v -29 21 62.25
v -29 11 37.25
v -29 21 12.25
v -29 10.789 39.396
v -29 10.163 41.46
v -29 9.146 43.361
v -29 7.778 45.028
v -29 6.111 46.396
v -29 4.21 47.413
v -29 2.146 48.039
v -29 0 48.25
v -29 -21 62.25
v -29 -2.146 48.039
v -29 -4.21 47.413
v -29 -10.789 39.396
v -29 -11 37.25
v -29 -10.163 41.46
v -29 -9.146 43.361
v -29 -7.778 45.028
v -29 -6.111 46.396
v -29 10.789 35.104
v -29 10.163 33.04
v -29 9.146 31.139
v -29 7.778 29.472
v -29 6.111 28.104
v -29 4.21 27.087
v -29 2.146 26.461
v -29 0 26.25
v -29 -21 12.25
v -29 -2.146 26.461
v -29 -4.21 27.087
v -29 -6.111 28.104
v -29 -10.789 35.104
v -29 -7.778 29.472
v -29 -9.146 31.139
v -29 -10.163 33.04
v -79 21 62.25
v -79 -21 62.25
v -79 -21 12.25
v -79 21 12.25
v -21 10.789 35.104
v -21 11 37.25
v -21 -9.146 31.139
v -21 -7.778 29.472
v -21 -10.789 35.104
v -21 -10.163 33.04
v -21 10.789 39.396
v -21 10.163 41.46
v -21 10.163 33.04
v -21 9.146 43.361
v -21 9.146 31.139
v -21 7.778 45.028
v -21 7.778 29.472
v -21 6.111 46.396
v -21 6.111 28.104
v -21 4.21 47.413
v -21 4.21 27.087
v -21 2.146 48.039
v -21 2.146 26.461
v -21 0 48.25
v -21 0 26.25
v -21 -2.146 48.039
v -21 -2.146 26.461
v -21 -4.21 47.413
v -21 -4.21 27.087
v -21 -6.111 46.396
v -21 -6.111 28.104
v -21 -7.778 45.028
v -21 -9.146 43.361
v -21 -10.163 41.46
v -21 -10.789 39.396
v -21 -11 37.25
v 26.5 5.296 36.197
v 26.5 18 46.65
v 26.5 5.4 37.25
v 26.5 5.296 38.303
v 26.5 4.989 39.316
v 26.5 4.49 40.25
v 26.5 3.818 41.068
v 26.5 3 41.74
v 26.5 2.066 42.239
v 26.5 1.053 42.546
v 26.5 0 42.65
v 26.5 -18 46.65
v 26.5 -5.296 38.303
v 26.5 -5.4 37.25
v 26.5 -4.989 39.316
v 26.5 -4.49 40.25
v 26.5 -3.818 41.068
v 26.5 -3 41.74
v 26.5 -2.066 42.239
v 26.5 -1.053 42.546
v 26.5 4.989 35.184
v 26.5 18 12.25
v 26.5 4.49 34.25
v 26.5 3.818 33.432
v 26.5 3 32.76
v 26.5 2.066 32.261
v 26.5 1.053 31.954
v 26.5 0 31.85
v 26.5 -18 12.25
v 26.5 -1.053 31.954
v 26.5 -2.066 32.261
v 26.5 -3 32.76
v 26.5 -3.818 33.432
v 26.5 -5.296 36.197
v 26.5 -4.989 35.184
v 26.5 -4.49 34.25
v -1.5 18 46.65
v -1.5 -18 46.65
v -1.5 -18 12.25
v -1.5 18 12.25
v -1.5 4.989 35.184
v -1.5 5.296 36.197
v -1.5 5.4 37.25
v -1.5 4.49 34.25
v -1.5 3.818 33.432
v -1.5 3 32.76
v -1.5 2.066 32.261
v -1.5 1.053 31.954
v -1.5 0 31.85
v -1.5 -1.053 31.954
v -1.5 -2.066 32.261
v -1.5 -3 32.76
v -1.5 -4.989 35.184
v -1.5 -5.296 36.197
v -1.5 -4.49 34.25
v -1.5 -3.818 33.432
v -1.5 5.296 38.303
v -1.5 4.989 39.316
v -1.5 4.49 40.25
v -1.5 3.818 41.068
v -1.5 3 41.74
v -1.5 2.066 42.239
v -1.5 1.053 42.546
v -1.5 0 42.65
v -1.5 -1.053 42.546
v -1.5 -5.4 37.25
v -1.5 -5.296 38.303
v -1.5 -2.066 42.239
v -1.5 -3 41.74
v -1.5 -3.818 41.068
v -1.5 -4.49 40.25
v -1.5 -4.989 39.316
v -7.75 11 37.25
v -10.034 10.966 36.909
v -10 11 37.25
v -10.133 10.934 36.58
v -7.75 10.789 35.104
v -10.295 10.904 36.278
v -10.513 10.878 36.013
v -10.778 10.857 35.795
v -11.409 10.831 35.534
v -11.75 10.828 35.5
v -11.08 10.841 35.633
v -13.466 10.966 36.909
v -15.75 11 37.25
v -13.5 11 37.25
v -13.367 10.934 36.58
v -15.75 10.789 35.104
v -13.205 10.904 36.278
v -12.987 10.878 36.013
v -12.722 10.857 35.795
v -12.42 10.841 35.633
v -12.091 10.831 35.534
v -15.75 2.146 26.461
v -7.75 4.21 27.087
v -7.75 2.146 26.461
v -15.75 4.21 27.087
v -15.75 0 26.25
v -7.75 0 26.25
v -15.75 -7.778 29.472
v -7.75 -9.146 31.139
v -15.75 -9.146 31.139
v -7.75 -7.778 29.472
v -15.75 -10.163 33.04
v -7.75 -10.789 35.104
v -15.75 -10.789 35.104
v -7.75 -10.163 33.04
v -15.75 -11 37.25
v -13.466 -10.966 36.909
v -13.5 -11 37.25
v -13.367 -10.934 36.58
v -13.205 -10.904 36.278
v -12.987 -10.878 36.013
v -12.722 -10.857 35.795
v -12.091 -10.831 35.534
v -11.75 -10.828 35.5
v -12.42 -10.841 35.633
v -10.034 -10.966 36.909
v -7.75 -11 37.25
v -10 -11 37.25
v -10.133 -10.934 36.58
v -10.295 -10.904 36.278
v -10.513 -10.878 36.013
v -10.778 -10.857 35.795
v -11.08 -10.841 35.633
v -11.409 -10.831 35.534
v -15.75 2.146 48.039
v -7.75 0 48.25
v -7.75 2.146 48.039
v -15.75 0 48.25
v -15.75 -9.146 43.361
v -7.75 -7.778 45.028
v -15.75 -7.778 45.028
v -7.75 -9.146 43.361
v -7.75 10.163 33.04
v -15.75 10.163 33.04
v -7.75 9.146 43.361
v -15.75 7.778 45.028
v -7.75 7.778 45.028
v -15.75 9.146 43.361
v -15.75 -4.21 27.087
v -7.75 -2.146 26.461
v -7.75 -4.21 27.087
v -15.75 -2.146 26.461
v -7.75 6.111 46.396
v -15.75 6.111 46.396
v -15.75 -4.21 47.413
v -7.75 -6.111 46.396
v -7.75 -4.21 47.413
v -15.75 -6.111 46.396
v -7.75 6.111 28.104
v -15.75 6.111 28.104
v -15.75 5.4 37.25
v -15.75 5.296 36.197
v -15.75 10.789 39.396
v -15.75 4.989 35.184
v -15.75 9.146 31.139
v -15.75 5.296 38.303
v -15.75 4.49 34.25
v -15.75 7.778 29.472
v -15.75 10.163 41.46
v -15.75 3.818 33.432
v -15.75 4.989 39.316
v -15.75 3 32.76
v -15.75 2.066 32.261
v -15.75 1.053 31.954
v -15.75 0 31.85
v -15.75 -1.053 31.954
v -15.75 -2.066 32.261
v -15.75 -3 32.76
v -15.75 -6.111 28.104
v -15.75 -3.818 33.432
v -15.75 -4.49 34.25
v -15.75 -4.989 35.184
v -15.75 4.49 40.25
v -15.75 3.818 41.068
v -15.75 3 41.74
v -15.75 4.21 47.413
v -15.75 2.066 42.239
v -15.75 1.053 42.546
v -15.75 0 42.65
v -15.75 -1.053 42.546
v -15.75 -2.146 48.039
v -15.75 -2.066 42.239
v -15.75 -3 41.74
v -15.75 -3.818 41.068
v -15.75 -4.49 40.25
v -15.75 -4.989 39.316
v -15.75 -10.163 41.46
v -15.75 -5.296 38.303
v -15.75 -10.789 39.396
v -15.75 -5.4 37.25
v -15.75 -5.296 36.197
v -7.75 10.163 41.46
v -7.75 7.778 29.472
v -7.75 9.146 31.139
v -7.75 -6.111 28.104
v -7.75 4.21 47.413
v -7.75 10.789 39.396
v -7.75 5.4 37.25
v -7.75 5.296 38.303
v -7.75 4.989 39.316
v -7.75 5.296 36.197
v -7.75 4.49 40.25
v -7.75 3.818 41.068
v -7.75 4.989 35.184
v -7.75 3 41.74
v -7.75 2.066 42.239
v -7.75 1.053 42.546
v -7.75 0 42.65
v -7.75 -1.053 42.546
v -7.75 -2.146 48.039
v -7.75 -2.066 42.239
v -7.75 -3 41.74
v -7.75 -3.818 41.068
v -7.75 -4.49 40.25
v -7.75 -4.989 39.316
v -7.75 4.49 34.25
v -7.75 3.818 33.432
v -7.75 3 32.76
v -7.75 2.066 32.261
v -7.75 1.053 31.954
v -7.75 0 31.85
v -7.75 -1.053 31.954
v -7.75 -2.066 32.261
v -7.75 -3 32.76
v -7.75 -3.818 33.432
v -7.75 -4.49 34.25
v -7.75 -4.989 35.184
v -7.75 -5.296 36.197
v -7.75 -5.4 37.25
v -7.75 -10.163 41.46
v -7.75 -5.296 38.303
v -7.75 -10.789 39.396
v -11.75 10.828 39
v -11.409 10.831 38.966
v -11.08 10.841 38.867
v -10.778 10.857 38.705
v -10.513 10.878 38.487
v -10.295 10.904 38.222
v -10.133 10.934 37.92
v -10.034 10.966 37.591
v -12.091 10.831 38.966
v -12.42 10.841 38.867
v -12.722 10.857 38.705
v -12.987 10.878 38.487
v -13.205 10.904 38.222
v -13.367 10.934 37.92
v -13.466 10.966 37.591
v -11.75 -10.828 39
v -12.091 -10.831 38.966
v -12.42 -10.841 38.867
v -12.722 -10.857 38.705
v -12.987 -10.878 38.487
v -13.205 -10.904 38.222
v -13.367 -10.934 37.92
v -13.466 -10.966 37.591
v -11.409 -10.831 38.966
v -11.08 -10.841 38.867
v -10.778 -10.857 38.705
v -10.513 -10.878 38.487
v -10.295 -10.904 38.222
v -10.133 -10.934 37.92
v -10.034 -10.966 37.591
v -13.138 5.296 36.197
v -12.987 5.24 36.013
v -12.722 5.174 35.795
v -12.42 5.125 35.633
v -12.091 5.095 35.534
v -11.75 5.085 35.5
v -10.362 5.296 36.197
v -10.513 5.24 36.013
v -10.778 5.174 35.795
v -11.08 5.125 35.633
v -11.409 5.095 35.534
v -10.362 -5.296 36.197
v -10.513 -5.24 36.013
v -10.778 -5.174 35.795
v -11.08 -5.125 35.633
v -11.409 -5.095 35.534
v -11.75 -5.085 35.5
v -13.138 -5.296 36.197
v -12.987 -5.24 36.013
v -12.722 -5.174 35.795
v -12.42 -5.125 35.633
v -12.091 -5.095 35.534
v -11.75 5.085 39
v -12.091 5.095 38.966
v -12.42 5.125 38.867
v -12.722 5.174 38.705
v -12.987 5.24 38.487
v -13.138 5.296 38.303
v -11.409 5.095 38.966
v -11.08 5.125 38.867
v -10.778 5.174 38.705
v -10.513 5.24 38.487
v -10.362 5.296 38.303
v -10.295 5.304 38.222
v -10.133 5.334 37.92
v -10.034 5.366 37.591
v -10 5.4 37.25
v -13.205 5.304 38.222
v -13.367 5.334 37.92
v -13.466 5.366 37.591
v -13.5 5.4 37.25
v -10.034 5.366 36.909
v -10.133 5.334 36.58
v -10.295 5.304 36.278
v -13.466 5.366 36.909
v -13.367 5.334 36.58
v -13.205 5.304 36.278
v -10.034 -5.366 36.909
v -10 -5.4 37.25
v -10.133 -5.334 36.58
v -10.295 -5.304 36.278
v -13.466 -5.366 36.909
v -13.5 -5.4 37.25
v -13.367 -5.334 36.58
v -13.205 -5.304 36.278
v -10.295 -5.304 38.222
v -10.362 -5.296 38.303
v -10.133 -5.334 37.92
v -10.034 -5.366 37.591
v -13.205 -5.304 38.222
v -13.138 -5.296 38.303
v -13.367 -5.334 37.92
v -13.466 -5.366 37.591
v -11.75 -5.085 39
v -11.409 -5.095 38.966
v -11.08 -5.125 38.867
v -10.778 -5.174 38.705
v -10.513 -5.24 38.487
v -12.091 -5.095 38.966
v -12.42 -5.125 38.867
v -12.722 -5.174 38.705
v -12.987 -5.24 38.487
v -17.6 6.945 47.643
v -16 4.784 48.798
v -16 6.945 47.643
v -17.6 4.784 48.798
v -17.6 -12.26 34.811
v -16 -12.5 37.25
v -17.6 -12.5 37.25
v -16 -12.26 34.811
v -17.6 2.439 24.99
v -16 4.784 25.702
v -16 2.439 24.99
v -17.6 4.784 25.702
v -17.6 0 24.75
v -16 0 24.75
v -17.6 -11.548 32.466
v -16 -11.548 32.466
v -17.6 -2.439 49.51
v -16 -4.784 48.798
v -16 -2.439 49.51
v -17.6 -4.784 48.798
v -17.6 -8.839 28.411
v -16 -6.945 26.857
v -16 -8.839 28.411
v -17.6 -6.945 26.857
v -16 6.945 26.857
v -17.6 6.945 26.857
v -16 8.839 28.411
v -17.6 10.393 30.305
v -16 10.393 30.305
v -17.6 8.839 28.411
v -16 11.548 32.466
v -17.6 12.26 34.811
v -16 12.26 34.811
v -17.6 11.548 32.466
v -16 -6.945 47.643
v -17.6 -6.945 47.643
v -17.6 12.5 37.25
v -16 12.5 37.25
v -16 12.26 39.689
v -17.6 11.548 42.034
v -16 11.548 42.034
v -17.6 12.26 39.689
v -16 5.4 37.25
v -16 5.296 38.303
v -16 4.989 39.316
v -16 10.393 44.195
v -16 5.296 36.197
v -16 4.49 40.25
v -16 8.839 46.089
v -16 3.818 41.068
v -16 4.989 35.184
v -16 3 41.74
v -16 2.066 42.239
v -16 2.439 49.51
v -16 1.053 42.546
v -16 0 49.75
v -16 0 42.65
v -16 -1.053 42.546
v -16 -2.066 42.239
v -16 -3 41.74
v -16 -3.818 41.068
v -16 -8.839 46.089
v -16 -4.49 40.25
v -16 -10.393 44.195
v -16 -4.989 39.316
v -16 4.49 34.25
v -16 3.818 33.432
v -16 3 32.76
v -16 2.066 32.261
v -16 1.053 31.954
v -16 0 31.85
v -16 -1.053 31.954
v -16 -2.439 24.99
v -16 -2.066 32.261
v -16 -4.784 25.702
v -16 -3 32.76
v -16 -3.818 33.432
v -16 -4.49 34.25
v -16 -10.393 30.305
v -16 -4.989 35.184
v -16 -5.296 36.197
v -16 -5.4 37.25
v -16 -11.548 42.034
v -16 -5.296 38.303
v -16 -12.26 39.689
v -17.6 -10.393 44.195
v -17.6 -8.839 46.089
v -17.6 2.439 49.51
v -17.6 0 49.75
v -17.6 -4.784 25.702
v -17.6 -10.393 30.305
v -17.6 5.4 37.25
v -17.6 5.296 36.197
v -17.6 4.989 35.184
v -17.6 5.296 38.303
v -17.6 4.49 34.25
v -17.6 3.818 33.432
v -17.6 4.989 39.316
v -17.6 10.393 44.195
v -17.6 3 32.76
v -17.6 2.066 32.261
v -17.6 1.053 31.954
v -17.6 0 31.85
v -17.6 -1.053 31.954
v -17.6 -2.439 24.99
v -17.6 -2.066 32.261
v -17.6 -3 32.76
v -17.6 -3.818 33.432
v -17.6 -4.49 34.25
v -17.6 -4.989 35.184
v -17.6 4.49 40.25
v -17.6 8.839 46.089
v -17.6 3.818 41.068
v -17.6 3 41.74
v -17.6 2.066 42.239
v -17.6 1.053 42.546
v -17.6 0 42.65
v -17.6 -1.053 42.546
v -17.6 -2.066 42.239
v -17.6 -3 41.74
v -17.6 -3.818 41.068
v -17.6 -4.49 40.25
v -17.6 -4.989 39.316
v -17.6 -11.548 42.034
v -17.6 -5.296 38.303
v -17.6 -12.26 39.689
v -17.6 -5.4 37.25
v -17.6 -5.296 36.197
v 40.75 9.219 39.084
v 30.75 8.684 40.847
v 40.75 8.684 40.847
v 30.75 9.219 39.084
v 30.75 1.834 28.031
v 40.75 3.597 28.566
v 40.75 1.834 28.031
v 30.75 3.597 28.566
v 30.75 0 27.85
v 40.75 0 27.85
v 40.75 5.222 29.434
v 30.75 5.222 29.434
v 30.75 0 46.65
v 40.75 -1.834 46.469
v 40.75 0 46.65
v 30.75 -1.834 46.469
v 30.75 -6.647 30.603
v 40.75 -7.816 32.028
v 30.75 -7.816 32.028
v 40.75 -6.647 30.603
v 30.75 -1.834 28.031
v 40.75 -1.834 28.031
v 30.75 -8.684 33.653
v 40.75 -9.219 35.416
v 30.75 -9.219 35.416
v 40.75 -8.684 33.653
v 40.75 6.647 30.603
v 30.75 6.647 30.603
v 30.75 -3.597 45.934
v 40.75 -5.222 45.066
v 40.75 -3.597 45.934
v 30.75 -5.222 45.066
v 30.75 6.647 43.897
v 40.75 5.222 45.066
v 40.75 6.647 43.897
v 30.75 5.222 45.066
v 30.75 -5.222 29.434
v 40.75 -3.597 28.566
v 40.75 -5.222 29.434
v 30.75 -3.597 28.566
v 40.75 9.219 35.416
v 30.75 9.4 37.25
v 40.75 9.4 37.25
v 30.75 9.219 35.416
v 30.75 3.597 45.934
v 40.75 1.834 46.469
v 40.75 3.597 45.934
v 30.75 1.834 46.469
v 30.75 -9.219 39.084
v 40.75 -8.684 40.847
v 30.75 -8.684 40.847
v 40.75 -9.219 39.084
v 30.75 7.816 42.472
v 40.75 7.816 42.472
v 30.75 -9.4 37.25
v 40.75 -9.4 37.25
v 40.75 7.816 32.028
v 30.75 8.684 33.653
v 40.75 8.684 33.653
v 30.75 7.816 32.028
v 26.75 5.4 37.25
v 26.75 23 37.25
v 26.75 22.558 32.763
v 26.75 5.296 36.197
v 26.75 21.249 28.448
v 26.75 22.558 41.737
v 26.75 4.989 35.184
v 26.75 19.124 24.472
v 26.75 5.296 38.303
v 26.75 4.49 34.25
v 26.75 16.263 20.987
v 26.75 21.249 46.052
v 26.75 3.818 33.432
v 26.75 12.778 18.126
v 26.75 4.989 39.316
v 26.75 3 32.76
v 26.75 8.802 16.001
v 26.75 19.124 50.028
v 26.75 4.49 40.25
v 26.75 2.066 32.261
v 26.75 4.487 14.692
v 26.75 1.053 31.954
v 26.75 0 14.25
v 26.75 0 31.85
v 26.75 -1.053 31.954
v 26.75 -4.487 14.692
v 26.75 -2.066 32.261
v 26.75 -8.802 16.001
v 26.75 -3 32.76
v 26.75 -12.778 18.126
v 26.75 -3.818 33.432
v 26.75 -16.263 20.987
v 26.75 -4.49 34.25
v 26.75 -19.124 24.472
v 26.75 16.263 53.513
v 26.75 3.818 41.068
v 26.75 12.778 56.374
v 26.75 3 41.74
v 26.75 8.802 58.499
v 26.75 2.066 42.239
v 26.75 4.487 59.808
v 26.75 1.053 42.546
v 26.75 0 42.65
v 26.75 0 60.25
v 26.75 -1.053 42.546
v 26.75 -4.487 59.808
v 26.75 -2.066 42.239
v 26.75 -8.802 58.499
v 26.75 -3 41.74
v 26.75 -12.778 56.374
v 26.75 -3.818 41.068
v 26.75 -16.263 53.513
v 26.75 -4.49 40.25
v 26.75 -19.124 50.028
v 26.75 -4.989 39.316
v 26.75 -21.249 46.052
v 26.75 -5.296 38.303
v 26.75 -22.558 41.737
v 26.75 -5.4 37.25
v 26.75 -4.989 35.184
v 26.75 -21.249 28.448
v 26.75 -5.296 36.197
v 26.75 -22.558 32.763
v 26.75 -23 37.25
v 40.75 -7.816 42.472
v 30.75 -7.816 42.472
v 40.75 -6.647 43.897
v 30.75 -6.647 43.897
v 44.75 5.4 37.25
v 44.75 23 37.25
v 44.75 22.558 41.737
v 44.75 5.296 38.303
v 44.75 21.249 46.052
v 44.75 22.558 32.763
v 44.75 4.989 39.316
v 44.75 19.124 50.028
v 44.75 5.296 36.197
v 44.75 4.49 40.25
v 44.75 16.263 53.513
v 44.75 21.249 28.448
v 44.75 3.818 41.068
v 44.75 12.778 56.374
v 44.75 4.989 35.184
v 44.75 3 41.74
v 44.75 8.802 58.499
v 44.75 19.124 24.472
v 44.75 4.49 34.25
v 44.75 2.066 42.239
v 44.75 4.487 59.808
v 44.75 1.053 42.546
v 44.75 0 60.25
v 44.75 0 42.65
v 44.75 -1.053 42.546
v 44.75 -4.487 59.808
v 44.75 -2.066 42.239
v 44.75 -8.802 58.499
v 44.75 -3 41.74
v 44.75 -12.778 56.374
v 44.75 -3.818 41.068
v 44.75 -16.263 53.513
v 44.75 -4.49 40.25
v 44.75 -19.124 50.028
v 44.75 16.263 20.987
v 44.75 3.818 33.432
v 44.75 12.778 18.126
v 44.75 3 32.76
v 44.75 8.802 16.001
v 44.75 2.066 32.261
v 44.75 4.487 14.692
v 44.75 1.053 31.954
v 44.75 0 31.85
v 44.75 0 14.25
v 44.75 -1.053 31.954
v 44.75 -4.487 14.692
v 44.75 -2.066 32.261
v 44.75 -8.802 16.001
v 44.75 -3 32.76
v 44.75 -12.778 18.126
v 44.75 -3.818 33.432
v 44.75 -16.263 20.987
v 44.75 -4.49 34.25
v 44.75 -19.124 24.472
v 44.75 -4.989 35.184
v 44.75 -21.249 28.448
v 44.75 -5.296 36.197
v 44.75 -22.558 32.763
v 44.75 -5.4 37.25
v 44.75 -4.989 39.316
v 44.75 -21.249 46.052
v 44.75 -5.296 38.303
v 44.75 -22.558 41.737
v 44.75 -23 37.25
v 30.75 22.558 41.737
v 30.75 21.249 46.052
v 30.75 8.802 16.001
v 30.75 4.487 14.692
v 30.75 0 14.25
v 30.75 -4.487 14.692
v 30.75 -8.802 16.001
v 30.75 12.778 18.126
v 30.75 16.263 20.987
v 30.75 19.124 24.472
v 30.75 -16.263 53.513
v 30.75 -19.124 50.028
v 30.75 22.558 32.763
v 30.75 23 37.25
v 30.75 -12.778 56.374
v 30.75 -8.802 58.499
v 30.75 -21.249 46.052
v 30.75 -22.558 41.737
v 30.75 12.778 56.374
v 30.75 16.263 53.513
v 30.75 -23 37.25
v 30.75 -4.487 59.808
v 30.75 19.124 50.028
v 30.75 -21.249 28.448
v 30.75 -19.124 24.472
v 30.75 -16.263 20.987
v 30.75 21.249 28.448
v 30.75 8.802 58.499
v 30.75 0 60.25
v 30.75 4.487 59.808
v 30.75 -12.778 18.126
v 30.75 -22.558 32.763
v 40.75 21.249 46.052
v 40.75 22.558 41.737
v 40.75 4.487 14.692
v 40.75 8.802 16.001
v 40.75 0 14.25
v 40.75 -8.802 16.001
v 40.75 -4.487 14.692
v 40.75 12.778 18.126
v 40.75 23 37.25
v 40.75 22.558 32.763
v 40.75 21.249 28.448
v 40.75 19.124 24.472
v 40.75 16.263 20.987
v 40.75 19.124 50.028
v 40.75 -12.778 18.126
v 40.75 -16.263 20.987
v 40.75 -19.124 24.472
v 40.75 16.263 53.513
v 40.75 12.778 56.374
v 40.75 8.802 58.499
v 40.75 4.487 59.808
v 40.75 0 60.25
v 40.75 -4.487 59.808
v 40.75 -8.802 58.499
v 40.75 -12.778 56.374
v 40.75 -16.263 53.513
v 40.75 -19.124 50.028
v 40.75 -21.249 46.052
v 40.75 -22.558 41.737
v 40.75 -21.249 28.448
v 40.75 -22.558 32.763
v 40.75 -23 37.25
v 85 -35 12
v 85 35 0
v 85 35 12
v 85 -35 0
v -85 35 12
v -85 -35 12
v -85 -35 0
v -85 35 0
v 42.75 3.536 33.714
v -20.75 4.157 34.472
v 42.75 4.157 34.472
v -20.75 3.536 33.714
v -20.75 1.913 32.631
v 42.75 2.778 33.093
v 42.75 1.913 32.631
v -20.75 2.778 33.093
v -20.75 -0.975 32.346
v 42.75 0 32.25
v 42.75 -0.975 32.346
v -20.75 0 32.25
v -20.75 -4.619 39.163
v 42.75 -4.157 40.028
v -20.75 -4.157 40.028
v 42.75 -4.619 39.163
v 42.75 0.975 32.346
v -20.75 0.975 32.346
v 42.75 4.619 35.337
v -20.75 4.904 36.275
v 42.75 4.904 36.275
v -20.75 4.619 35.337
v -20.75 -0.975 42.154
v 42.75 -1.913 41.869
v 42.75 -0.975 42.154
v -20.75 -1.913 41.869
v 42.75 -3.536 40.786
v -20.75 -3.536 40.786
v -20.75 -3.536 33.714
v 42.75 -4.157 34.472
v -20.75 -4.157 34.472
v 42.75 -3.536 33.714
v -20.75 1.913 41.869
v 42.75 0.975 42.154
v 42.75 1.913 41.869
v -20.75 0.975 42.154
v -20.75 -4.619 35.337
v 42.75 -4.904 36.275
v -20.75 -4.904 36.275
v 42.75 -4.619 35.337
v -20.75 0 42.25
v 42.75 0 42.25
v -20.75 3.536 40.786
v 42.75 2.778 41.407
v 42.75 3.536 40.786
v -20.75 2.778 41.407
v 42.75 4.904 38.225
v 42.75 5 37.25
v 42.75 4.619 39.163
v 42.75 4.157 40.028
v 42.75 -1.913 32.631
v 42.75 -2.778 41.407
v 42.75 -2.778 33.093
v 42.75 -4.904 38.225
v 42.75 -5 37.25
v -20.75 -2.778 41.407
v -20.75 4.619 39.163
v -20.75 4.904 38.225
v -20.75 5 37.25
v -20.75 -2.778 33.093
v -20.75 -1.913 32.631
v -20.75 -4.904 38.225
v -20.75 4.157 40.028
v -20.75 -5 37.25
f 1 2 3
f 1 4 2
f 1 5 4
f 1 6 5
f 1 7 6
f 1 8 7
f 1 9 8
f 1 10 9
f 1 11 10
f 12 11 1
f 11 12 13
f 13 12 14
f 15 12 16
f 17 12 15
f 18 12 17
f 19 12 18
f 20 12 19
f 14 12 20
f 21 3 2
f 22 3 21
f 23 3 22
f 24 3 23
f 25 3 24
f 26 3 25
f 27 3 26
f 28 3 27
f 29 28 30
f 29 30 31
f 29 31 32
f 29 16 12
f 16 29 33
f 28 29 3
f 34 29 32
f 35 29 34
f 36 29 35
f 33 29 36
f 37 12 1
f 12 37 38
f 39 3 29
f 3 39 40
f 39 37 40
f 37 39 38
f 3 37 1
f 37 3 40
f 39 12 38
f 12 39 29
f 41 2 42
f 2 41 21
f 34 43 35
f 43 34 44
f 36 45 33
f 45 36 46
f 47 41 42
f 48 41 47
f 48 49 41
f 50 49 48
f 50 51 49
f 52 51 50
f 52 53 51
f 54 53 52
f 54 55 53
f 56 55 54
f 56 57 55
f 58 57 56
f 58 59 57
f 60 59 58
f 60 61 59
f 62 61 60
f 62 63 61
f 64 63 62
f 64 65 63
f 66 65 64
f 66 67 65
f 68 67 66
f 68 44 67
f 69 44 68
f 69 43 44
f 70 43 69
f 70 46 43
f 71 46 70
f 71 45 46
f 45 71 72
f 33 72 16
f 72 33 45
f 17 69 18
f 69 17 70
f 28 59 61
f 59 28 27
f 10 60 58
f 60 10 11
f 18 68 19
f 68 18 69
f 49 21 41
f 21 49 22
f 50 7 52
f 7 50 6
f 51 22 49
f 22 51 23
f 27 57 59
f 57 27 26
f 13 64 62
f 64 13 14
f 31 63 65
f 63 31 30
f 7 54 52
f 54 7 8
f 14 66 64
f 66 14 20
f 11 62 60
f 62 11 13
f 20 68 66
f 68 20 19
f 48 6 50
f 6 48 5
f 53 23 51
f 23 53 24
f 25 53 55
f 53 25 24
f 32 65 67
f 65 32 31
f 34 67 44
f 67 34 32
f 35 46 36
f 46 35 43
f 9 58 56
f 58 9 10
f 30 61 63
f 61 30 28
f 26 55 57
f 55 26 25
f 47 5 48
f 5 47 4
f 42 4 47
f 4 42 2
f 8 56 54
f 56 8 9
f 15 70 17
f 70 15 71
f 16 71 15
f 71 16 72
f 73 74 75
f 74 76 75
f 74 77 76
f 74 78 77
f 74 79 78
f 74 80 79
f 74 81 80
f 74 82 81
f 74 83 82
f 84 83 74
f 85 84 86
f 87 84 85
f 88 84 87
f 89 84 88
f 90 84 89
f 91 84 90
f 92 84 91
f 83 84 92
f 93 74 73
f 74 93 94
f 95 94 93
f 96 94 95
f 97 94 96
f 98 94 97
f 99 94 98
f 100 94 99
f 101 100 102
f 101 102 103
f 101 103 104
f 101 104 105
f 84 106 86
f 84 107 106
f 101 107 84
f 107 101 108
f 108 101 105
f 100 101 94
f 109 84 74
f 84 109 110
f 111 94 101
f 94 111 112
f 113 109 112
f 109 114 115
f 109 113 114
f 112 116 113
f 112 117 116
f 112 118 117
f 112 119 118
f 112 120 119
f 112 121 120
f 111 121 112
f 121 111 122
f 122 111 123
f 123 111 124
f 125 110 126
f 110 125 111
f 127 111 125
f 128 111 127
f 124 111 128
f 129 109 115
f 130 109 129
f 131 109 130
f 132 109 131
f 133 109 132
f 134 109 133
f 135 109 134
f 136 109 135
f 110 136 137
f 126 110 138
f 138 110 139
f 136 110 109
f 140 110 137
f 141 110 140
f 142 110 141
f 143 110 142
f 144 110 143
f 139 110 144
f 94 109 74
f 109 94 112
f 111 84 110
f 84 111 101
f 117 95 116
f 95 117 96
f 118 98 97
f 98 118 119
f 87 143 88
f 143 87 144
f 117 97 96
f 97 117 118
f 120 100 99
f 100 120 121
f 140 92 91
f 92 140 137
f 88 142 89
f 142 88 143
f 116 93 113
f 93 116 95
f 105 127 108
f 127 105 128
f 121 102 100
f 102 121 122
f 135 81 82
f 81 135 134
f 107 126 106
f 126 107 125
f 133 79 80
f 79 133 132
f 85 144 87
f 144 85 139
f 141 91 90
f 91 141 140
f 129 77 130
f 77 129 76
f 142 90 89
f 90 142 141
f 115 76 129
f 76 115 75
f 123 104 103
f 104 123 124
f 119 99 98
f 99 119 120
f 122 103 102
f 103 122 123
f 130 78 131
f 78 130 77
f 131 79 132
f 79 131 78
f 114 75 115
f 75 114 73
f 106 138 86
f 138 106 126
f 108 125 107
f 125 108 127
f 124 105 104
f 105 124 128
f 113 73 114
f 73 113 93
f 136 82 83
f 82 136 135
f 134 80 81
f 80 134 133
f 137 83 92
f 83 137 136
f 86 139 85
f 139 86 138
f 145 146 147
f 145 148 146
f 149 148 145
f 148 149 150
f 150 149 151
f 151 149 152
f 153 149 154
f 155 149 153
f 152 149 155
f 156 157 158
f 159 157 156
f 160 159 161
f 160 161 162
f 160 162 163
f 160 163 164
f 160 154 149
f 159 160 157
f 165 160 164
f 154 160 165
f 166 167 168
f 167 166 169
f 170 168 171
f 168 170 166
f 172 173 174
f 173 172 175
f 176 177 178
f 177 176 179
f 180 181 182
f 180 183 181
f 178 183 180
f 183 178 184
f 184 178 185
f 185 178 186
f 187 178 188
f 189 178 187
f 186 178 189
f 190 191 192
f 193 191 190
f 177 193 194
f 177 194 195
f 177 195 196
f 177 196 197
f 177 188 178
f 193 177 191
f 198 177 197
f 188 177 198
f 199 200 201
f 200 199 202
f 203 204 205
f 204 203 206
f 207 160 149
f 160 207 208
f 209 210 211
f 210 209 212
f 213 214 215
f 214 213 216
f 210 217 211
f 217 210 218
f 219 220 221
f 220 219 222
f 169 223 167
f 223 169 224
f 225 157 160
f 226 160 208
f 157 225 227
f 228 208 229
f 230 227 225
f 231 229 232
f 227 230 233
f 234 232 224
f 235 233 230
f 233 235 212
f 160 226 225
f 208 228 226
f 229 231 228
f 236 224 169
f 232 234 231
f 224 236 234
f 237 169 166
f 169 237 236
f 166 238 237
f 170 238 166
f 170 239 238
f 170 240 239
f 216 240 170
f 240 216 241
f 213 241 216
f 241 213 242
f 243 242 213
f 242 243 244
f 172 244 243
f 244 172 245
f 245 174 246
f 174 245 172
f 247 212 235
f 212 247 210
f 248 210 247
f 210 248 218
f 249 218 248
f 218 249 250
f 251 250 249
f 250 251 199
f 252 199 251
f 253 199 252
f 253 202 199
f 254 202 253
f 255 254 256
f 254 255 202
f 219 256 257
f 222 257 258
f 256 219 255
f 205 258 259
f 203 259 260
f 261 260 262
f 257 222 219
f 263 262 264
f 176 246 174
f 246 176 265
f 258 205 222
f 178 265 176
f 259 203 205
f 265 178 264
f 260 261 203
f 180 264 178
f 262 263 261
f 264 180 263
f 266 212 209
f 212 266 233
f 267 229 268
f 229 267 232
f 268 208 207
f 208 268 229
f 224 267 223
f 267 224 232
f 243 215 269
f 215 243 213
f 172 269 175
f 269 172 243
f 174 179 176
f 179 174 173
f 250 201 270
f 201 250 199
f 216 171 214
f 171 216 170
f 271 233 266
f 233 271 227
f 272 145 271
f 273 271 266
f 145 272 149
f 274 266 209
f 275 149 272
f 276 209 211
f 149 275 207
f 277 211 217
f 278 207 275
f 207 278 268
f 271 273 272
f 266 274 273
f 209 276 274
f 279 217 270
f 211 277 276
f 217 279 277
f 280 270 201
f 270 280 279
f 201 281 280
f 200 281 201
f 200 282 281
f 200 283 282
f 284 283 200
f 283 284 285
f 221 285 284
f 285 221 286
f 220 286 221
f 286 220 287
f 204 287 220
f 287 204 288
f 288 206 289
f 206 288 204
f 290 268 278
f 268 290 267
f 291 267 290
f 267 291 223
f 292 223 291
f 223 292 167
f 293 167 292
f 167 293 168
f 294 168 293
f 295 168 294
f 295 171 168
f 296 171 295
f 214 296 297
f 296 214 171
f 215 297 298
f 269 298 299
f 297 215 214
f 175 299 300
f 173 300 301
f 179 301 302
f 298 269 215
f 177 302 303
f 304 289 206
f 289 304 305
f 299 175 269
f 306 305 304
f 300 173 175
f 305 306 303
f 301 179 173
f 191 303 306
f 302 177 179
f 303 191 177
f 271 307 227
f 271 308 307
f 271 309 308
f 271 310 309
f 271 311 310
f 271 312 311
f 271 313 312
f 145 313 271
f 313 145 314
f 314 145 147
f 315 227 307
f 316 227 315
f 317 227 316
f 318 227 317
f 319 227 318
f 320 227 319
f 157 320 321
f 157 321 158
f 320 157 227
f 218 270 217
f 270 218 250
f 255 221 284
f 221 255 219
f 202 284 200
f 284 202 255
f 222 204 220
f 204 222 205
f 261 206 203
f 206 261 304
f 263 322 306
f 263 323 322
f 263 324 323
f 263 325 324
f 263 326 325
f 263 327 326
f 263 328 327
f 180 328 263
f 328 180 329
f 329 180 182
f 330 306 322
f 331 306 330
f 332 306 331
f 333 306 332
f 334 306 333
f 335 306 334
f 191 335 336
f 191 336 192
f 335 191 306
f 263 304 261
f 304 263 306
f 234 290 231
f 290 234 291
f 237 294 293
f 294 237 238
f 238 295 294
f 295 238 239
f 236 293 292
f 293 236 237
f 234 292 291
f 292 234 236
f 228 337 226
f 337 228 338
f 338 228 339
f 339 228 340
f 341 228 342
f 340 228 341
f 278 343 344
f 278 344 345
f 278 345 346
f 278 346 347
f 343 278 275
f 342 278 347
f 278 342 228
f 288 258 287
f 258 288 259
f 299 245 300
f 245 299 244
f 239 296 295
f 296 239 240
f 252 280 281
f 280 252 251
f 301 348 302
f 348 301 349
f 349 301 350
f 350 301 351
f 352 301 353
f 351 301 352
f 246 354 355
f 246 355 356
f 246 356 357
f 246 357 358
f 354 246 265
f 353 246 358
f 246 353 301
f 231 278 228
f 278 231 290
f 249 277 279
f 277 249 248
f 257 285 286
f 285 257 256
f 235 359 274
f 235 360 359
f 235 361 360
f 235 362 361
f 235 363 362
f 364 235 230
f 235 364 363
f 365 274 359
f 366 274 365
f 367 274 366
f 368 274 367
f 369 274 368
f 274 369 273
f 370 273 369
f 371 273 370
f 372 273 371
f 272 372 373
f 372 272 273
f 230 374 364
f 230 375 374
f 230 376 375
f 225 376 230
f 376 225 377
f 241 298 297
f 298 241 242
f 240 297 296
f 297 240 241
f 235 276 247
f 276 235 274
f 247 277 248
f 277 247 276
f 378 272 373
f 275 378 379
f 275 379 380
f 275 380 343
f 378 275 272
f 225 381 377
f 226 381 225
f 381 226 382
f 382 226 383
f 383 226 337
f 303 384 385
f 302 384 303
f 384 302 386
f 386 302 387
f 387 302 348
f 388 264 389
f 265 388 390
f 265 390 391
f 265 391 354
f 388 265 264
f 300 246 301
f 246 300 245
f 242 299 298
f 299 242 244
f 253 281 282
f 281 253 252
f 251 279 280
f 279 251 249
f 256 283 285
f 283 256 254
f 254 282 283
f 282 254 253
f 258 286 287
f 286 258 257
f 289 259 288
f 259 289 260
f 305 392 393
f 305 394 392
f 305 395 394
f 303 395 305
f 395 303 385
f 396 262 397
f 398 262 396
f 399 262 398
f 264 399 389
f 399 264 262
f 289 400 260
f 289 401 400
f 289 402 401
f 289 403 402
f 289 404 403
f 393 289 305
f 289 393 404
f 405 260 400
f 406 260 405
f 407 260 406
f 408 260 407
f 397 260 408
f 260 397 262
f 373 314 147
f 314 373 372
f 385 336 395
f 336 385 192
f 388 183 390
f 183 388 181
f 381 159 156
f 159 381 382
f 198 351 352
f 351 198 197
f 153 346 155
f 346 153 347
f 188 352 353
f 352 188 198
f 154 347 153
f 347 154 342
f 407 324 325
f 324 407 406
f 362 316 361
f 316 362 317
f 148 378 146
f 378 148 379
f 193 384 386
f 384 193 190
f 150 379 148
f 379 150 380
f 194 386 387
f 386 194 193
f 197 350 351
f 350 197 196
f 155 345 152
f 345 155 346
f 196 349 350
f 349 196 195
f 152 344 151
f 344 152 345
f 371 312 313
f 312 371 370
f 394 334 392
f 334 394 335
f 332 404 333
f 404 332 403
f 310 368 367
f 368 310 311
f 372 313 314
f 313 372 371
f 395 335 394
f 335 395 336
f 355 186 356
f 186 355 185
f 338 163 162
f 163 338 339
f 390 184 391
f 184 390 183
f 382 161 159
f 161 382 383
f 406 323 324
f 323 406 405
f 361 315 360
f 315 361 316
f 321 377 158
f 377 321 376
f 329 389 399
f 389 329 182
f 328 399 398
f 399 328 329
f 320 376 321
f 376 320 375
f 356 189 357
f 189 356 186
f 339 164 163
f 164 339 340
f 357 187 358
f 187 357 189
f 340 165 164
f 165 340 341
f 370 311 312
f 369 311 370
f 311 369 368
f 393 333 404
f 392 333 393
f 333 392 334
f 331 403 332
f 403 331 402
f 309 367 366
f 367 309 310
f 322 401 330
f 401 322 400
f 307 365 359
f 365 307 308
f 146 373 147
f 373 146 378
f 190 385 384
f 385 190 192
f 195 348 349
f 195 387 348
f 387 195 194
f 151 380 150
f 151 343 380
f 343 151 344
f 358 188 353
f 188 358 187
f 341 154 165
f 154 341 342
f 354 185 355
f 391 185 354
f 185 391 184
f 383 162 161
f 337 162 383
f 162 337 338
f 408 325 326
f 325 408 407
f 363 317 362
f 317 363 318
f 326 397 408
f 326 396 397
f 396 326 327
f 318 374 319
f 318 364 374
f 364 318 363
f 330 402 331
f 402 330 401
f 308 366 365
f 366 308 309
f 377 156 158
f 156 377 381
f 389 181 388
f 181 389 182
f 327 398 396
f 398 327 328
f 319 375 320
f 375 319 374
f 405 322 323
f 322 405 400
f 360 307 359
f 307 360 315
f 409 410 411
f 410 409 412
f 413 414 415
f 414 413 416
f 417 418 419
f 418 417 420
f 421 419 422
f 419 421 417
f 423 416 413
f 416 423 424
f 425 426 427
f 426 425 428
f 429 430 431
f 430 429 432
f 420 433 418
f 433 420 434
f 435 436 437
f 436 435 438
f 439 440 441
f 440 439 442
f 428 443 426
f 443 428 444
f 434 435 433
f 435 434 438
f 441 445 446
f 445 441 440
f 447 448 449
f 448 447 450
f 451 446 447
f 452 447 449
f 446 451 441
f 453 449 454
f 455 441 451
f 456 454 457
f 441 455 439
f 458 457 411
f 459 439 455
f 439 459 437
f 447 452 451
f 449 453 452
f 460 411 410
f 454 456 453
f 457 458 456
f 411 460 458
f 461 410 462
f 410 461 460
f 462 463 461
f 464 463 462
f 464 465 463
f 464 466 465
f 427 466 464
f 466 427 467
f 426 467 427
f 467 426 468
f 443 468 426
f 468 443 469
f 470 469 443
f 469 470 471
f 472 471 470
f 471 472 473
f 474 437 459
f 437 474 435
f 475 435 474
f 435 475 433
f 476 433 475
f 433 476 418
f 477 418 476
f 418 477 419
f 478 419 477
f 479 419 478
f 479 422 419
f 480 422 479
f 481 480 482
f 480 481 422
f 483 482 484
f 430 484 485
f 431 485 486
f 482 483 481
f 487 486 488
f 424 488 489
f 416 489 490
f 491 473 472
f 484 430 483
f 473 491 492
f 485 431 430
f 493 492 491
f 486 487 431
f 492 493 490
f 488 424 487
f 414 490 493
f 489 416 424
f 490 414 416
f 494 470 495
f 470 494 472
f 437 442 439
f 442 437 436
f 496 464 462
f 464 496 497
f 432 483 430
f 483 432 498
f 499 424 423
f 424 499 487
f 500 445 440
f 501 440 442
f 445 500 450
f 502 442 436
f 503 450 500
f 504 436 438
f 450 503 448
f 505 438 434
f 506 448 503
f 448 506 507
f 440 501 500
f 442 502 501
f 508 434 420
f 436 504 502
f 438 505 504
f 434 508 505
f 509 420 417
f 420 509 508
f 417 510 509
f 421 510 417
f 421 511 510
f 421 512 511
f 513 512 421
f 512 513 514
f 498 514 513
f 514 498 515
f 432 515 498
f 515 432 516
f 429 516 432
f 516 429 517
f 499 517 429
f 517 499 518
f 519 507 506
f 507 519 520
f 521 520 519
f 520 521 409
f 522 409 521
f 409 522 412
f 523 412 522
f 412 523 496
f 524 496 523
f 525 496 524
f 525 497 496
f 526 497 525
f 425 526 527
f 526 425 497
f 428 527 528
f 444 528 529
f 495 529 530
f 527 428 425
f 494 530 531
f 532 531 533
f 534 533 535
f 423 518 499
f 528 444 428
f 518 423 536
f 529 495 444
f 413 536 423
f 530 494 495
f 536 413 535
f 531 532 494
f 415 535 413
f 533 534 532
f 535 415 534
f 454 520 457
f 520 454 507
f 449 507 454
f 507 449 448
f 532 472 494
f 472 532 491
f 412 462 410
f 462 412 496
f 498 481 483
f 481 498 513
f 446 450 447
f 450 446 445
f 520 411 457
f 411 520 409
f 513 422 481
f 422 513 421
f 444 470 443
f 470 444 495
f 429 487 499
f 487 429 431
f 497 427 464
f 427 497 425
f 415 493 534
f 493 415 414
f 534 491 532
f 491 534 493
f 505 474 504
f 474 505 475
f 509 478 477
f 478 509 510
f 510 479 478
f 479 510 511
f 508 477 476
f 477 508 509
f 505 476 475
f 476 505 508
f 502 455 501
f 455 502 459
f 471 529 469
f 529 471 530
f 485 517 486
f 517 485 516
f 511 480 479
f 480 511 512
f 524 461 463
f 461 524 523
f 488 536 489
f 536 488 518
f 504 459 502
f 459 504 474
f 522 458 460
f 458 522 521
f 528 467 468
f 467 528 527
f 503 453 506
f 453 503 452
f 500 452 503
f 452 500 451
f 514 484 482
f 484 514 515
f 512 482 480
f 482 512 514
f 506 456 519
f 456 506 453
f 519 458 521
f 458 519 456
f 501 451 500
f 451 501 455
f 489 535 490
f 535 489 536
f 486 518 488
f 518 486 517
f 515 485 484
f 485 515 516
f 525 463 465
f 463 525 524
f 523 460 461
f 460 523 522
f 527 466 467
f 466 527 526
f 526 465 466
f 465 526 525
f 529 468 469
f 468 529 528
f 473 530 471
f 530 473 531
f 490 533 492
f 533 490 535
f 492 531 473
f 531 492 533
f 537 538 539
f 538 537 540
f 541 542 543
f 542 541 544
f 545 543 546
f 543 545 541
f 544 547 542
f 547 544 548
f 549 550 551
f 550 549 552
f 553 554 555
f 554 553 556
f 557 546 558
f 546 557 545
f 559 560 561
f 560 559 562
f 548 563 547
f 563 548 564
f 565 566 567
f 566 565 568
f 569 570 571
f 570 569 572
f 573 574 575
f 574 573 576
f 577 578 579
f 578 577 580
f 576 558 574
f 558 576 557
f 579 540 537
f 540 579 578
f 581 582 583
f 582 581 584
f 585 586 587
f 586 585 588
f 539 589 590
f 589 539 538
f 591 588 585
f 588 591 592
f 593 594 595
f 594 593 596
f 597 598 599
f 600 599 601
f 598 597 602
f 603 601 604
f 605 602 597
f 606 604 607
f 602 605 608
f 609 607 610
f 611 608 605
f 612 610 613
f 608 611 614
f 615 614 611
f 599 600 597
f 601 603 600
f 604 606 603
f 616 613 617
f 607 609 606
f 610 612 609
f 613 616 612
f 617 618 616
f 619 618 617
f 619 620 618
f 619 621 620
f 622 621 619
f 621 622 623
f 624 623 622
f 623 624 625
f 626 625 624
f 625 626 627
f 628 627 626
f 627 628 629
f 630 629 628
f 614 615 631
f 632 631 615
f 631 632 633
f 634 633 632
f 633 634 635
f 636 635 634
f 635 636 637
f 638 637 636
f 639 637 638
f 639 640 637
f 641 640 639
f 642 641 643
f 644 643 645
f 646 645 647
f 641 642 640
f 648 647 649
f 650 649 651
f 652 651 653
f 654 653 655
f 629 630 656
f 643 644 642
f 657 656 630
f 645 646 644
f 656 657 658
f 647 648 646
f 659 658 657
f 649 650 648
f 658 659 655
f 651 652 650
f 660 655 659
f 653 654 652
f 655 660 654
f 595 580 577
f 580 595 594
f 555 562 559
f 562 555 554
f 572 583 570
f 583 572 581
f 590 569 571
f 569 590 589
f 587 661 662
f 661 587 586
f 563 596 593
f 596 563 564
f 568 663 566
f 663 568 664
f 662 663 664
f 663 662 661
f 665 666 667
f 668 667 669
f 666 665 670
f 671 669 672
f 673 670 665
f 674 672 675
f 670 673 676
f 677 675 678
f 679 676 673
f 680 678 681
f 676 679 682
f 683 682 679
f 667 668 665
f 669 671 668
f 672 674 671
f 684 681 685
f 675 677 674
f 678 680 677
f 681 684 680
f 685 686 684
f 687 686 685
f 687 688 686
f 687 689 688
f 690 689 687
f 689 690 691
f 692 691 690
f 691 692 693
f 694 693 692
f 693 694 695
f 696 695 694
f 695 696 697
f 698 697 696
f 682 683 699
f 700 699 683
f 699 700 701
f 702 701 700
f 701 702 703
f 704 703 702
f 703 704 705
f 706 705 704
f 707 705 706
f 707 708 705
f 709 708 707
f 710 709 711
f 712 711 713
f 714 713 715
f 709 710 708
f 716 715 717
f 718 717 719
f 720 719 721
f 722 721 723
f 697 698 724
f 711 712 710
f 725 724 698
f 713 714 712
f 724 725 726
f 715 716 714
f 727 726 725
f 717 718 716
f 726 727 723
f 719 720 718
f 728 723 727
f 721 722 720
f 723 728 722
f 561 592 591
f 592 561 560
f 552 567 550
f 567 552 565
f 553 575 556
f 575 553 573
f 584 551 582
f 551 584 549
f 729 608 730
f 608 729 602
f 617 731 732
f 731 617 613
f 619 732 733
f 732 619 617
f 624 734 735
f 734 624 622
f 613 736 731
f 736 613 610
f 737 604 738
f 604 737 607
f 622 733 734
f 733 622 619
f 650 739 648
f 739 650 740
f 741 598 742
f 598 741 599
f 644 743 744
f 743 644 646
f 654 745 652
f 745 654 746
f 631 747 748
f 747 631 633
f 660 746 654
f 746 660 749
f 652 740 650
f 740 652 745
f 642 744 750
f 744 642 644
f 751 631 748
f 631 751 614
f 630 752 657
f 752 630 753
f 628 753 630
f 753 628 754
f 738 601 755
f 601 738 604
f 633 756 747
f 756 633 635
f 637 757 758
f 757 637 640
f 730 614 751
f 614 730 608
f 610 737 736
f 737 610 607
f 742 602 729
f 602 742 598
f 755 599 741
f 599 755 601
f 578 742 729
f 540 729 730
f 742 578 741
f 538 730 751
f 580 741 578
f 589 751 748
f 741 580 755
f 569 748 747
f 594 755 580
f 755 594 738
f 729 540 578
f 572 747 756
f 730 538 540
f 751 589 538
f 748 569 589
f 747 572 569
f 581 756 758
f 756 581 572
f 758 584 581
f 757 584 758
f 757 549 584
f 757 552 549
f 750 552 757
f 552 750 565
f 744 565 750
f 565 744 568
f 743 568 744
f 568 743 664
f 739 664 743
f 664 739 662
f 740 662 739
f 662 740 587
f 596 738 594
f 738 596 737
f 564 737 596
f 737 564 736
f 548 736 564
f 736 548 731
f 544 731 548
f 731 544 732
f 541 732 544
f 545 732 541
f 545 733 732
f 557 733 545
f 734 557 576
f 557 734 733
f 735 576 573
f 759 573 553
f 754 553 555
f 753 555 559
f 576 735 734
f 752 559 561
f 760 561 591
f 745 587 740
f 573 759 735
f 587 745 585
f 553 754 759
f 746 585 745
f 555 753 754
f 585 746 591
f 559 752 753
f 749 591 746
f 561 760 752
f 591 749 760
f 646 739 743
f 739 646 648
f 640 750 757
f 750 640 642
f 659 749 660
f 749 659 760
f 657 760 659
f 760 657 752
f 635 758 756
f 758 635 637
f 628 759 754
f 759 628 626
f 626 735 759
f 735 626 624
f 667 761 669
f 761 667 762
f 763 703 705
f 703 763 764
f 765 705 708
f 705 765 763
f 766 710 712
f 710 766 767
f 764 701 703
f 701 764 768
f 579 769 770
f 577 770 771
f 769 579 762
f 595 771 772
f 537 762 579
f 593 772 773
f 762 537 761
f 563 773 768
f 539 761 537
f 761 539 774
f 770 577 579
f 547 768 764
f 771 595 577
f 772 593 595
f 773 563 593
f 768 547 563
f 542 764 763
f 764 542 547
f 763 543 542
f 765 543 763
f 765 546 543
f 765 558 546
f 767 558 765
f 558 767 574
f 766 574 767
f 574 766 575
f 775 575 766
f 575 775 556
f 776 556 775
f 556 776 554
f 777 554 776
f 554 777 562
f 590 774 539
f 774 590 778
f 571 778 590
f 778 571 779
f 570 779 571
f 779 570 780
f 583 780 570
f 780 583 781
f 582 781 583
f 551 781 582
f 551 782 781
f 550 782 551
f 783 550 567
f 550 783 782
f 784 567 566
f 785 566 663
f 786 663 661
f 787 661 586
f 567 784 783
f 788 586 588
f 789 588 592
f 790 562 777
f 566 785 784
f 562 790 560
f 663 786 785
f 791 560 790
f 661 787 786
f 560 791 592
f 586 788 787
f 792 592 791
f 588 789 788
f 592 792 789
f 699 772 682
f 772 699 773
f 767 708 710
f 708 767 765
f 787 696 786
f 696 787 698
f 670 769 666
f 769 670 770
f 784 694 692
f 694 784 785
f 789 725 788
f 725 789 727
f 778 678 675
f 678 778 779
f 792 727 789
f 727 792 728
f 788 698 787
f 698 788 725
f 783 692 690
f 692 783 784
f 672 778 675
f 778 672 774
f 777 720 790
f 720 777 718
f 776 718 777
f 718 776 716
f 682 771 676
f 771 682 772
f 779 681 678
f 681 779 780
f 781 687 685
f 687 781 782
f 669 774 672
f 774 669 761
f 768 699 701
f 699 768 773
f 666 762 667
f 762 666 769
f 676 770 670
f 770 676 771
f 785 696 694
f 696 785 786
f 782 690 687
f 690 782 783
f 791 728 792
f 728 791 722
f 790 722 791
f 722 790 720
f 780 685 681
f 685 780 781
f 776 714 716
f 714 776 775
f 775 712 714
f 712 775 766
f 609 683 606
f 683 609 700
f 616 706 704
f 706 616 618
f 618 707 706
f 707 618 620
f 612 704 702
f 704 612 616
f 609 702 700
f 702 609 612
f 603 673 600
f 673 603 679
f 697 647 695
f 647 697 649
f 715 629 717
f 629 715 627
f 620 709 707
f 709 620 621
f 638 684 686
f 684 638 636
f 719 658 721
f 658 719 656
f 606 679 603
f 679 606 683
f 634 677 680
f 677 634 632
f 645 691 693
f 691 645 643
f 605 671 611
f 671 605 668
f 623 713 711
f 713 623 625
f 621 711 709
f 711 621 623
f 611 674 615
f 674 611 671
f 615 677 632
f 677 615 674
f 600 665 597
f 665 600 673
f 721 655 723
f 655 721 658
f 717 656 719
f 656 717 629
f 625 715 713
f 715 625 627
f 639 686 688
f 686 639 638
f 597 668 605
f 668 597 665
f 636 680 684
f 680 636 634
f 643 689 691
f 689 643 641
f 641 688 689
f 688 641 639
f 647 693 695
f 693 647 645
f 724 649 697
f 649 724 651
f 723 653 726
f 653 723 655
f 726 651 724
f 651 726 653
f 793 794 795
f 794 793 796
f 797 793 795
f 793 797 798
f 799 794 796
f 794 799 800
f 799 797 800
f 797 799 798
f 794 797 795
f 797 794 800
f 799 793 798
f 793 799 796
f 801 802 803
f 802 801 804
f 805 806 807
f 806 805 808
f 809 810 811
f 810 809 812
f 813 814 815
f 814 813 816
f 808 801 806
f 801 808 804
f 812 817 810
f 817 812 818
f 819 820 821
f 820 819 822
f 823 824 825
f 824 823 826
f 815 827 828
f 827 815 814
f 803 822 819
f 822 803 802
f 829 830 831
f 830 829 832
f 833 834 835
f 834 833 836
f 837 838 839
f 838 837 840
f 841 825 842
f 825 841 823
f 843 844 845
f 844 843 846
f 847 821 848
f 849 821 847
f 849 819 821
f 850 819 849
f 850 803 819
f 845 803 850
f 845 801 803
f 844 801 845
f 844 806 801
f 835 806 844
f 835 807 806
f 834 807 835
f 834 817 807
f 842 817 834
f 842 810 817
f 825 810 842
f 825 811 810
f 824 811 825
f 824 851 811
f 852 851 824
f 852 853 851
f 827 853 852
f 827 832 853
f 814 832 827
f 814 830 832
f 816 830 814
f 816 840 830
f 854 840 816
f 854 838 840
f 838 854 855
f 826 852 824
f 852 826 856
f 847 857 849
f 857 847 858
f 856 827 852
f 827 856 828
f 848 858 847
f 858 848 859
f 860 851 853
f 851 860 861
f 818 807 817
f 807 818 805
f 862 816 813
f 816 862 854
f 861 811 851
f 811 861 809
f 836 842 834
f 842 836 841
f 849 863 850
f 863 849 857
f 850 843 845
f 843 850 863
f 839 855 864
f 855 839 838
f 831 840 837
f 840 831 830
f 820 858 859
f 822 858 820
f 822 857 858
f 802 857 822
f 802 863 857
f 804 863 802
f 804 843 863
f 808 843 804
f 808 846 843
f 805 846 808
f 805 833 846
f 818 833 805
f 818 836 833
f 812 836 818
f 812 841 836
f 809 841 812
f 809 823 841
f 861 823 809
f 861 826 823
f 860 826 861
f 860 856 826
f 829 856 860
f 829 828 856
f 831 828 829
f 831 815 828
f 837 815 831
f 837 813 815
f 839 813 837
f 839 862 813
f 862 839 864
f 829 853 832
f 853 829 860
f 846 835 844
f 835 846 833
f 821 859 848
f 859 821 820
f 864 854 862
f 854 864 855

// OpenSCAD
$fn = 32;

// ------------------------------------------------------------------------
// Motor drive station: motor 50 x 50 mm, shaft d10, pulley d46
// Every part is its own module, assembly() places every instance.
// ------------------------------------------------------------------------

// --- part 1 ---
module station_bed() {
  difference() {
    translate([-85, -35, 0]) cube([170, 70, 12]);
  }
}

// --- part 2 ---
module drive_motor() {
  union() {
    translate([-25, -21, 0]) cube([50, 42, 50]);
    translate([29, 0, 25]) rotate([0, 90, 0]) cylinder(h = 8, d = 22, center = true);
  }
}

// --- part 3 ---
module pillow_block() {
  difference() {
    translate([-14, -18, 0]) cube([28, 36, 34.4]);
    translate([0, 0, 25]) rotate([0, 90, 0]) cylinder(h = 30, d = 10.8, center = true);
  }
}

// --- part 4 ---
module drive_shaft() {
  translate([0, 0, -31.75]) cylinder(h = 63.5, d = 10);
}

// --- part 5 ---
module shaft_collar() {
  difference() {
    cylinder(h = 8, d = 22);
    translate([0, 0, -1]) cylinder(h = 10, d = 10.8);
    translate([0, 0, 4]) rotate([90, 0, 0]) cylinder(h = 24, d = 3.5, center = true);
  }
}

// --- part 6 ---
module collar_washer() {
  difference() {
      translate([0, 0, 0]) cylinder(h = 1.6, d = 25);
      translate([0, 0, -1]) cylinder(h = 3.6, d = 10.8);
    }
}

// --- part 7 ---
module drive_pulley() {
  difference() {
    union() {
      cylinder(h = 18, d = 18.8);
      cylinder(h = 4, d = 46);
      translate([0, 0, 14]) cylinder(h = 4, d = 46);
    }
    translate([0, 0, -1]) cylinder(h = 20, d = 10.8);
  }
}

// --- assembly ---
module assembly() {
  color([0.80, 0.24, 0.20]) translate([0, 0, 0]) rotate([0, 0, 0]) station_bed();
  color([0.20, 0.45, 0.75]) translate([-54, 0, 12.25]) rotate([0, 0, 0]) drive_motor();
  color([0.25, 0.62, 0.32]) translate([12.5, 0, 12.25]) rotate([0, 0, 0]) pillow_block();
  color([0.92, 0.70, 0.18]) translate([11, 0, 37.25]) rotate([0, 90, 0]) drive_shaft();
  color([0.58, 0.35, 0.70]) translate([-15.75, 0, 37.25]) rotate([0, 90, 0]) shaft_collar();
  color([0.16, 0.66, 0.66]) translate([-17.6, 0, 37.25]) rotate([0, 90, 0]) collar_washer();
  color([0.85, 0.48, 0.18]) translate([26.75, 0, 37.25]) rotate([0, 90, 0]) drive_pulley();
}

assembly();
